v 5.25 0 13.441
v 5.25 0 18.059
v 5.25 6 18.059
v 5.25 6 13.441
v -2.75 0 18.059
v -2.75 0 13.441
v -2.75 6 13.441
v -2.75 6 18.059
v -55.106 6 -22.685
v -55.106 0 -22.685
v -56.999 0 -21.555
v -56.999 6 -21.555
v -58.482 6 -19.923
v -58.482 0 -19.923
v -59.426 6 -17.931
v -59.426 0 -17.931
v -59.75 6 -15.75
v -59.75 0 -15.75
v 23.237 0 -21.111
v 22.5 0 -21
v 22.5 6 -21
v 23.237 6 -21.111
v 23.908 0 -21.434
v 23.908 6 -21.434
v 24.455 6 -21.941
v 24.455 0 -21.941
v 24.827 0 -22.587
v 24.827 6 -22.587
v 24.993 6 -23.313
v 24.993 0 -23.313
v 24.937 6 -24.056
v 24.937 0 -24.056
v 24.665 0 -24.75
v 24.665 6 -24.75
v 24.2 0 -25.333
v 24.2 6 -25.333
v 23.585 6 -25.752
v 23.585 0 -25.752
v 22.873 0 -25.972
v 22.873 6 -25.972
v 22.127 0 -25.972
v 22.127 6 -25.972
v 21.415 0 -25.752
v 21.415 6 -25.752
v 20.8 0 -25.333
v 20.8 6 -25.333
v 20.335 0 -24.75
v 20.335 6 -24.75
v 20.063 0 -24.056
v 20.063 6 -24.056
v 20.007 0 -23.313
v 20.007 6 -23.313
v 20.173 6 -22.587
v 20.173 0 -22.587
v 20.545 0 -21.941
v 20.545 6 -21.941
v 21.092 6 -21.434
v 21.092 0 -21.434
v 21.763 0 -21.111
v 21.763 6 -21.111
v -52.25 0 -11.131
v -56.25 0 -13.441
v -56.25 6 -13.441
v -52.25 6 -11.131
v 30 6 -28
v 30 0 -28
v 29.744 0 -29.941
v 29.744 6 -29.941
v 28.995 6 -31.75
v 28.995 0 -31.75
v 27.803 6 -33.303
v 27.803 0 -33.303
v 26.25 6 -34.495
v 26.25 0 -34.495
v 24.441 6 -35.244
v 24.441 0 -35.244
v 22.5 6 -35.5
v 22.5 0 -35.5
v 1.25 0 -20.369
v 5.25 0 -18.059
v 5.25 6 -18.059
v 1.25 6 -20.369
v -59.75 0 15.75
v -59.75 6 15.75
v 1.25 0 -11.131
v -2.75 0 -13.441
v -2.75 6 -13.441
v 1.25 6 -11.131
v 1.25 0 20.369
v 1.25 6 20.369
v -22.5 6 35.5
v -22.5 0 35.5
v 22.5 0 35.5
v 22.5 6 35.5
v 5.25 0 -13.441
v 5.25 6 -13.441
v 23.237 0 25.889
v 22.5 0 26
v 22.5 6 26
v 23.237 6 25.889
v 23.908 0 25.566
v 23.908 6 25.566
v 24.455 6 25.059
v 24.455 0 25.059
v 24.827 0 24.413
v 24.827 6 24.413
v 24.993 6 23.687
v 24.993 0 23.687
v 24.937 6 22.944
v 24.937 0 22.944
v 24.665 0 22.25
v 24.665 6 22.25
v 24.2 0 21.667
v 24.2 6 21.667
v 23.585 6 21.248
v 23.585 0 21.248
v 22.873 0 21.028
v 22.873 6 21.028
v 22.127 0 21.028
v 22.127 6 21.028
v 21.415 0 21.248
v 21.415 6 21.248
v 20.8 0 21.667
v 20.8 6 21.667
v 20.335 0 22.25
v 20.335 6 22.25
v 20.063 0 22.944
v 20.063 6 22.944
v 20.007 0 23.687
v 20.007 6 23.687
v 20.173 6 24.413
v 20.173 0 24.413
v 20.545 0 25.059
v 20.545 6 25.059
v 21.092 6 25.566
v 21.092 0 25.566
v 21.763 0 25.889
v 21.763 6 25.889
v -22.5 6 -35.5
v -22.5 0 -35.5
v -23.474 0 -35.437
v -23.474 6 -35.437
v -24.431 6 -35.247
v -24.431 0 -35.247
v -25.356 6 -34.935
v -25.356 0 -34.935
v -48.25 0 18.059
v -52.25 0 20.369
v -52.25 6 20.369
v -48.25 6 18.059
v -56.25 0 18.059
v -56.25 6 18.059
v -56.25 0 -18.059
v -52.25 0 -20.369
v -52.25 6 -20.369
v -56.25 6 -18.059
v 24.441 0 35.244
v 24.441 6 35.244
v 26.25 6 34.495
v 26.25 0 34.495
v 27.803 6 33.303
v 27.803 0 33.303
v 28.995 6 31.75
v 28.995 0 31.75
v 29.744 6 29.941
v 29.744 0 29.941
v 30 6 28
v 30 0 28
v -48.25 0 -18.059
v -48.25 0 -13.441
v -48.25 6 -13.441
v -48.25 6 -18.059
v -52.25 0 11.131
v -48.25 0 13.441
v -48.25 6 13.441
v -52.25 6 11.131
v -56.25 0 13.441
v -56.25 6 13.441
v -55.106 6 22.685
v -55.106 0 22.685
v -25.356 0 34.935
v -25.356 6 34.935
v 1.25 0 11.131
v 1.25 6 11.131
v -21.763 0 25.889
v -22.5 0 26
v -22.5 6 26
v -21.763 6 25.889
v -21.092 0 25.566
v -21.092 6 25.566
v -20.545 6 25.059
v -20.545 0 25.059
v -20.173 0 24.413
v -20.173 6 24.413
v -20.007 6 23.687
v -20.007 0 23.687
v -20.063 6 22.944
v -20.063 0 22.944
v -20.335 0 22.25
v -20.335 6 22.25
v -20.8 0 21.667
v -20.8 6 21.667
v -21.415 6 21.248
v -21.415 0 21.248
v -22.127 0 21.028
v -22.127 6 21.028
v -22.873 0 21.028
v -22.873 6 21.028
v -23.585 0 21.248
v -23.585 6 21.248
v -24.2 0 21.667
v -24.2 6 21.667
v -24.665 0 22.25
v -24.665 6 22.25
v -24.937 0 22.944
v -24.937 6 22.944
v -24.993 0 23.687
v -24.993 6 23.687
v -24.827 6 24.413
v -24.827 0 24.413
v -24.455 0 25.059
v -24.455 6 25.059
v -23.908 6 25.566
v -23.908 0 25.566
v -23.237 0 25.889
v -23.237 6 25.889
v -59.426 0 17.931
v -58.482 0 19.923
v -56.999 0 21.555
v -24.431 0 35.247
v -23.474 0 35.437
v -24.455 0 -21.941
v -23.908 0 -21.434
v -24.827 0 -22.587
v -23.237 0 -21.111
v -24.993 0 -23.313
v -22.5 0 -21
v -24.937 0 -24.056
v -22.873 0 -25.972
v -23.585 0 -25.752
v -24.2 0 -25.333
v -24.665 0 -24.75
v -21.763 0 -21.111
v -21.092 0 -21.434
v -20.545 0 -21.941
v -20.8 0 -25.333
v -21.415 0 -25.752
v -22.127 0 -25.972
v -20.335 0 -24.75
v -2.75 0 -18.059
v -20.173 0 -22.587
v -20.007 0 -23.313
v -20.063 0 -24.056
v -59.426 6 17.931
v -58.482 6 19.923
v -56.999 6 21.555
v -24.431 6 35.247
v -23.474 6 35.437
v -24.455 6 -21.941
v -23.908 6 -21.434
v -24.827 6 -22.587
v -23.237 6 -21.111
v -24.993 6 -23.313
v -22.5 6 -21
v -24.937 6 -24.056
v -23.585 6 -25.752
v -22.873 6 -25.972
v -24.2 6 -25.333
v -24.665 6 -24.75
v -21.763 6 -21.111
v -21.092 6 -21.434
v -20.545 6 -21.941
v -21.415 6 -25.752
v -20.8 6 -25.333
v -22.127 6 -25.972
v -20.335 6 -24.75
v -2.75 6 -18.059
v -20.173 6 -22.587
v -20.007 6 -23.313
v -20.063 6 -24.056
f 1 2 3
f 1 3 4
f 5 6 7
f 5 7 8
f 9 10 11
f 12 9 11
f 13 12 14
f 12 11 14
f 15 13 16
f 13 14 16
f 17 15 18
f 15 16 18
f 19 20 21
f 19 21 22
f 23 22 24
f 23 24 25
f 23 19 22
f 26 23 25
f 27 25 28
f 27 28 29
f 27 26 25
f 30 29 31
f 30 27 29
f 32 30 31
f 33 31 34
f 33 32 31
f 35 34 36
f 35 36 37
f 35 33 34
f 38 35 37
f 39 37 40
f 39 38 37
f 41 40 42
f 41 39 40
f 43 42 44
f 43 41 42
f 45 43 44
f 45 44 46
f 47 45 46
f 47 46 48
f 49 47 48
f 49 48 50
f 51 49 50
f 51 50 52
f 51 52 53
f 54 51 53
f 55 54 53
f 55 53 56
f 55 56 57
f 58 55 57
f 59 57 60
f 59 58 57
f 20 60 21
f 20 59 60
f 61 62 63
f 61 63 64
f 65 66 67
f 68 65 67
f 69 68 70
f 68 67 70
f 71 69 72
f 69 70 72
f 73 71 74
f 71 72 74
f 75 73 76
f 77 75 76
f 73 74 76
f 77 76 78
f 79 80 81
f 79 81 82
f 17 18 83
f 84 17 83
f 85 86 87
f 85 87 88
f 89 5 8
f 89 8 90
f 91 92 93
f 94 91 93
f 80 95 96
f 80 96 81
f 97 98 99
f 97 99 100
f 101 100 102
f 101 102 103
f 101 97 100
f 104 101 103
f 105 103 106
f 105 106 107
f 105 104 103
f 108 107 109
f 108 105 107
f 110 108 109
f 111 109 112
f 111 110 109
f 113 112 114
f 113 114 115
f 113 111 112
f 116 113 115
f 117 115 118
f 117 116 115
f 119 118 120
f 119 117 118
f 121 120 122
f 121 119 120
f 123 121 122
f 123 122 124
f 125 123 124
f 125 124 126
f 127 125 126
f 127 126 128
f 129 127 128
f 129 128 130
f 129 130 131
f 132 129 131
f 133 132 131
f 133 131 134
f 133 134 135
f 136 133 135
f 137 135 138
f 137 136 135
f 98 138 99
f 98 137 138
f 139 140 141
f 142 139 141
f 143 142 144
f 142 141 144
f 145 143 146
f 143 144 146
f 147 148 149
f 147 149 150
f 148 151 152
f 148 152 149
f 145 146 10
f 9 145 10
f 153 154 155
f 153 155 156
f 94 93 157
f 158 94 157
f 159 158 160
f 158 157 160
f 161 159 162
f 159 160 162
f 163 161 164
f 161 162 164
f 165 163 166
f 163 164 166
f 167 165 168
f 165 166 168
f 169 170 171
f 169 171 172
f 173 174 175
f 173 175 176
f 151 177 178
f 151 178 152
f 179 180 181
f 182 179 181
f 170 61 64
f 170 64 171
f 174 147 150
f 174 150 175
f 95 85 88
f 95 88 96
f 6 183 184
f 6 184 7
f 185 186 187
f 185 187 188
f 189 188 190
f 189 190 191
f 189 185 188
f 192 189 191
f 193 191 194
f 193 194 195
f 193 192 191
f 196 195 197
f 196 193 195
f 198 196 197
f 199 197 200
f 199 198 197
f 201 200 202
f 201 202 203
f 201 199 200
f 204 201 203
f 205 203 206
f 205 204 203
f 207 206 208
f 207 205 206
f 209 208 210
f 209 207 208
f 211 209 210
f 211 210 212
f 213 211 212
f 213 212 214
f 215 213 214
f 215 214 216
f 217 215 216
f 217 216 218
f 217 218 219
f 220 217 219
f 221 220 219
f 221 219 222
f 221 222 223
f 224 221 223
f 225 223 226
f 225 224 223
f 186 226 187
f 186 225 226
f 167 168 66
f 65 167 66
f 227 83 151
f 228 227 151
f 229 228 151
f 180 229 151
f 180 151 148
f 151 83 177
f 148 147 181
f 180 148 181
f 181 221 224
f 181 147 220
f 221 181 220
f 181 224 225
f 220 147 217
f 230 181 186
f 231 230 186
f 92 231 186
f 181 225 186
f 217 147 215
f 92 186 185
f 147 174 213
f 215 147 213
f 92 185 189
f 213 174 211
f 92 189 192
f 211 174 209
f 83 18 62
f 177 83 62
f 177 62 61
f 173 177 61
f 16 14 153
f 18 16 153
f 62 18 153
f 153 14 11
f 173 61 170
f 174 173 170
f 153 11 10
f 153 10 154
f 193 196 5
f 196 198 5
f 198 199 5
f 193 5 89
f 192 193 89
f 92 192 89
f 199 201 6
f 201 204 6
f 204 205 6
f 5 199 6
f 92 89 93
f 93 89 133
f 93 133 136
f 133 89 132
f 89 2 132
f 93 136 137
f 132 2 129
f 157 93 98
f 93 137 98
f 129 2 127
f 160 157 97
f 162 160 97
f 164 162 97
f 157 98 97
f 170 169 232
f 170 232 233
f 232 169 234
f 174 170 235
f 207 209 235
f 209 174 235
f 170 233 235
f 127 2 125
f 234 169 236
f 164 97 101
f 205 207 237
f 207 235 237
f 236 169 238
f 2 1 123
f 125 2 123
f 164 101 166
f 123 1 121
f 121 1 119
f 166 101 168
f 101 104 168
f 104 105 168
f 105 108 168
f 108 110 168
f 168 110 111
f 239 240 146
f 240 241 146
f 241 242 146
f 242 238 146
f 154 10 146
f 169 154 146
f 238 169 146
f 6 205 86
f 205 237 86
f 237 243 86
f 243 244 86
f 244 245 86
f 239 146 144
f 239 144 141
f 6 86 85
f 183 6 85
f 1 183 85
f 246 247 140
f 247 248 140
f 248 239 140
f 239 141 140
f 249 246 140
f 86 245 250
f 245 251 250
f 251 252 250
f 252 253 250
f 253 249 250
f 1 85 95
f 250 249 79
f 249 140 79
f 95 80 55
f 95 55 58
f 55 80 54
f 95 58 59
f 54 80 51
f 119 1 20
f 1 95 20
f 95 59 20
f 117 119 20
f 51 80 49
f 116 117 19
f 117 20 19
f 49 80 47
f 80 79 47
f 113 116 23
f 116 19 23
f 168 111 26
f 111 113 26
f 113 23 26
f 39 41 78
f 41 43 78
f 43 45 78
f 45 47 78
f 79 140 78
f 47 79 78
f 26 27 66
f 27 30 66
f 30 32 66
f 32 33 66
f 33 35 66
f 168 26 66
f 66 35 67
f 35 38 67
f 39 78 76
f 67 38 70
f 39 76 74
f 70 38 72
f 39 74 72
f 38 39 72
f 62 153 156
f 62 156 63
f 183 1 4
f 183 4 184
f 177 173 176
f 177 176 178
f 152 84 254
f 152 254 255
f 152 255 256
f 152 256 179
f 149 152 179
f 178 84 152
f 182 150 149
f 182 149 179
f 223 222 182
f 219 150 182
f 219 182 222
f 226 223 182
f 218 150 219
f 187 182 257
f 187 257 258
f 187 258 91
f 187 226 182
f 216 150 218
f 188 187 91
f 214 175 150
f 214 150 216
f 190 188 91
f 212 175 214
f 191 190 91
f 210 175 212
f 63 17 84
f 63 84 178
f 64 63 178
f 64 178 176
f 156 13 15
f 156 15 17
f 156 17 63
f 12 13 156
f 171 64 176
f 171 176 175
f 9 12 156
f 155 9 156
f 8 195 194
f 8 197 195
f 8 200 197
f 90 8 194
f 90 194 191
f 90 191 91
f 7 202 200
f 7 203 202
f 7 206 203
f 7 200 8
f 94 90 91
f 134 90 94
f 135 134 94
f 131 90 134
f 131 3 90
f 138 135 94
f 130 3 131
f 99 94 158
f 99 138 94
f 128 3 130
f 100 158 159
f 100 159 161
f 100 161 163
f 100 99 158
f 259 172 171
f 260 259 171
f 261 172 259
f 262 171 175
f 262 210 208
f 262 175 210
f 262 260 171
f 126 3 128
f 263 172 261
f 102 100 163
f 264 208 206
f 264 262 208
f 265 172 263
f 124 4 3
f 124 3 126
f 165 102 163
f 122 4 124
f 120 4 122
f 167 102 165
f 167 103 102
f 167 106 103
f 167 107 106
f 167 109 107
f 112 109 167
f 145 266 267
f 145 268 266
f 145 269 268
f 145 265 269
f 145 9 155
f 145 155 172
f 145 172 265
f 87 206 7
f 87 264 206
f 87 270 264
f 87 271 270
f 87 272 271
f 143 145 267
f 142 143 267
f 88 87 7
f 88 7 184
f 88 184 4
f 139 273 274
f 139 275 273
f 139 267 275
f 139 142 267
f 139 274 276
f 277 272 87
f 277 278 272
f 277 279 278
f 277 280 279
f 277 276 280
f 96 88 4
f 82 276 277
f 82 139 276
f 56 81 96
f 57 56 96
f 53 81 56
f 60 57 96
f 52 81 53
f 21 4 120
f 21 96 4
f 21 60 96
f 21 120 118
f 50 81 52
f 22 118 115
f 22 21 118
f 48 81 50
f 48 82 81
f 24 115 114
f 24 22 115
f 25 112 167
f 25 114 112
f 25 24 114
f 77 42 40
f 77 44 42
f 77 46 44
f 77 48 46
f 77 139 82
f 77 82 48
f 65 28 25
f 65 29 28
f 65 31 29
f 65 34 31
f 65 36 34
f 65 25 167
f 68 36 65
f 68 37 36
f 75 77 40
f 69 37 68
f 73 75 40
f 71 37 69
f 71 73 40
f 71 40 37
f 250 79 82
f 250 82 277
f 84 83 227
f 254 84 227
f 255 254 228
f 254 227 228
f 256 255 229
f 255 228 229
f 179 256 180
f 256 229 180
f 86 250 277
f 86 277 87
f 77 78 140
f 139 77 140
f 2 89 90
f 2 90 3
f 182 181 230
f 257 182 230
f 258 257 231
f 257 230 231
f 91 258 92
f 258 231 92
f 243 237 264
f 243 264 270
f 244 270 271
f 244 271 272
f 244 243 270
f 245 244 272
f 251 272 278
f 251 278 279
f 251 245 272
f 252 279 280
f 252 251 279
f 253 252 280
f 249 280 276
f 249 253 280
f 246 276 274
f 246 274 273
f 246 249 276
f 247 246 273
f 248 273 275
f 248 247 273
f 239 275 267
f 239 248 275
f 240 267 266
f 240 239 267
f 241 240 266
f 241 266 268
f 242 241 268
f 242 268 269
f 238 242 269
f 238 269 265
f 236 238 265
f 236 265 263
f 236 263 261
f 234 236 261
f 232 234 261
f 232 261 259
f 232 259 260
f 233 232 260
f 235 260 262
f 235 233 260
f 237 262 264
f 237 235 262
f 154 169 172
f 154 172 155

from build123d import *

# Parameters (mm, degrees)
SKETCH1_R               = 7.5
SKETCH1_R_2             = 2.75
SKETCH1_R_3             = 2.5
BOSS_EXTRUDE1_DEPTH     = 6
CUT_EXTRUDE1_DEPTH      = 70.758959998
CUT_EXTRUDE1_DEPTH_BACK = 70.758959998


with BuildPart() as part:
    # Sketch1 → Boss-Extrude1 (new body)
    # profile 1 of 7: a face of its own
    with BuildSketch(Plane(origin=(0, 0, 0), x_dir=(1, 0, 0), z_dir=(0, 1, 0))):
        with Locations((-52.25, 15.75)):
            Circle(SKETCH1_R)
        with Locations(Location((-52.25, 15.75, 0), (0, 0, 270))):
            Circle(SKETCH1_R_2, mode=Mode.SUBTRACT)
    # profile 2 of 7: a face of its own
    with BuildSketch(Plane(origin=(0, 0, 0), x_dir=(1, 0, 0), z_dir=(0, 1, 0))):
        with BuildLine():
            ThreePointArc((-44.75, 15.75), (-52.25, 8.25), (-59.75, 15.75))
            Line((-59.75, 15.75), (-59.75, -15.75))
            ThreePointArc((-59.75, -15.75), (-52.25, -8.25), (-44.75, -15.75))
            ThreePointArc((-44.75, -15.75), (-48.076702535, -21.981660154), (-55.105623539, -22.685085739))
            Line((-55.105623539, -22.685085739), (-25.355623539, -34.935085739))
            ThreePointArc((-25.355623539, -34.935085739), (-26.673297465, -21.768339846), (-15, -28))
            ThreePointArc((-15, -28), (-17.196699141, -33.303300859), (-22.5, -35.5))
            Line((-22.5, -35.5), (22.5, -35.5))
            ThreePointArc((22.5, -35.5), (17.196699141, -22.696699141), (30, -28))
            Line((30, -28), (30, 28))
            ThreePointArc((30, 28), (17.196699141, 22.696699141), (22.5, 35.5))
            Line((22.5, 35.5), (-22.5, 35.5))
            ThreePointArc((-22.5, 35.5), (-17.196699141, 33.303300859), (-15, 28))
            ThreePointArc((-15, 28), (-26.673297465, 21.768339846), (-25.355623539, 34.935085739))
            Line((-25.355623539, 34.935085739), (-55.105623539, 22.685085739))
            ThreePointArc((-55.105623539, 22.685085739), (-48.076702535, 21.981660154), (-44.75, 15.75))
        make_face()
        with Locations(Location((1.25, -15.75, 0), (0, 0, 270))):
            Circle(SKETCH1_R_2, mode=Mode.SUBTRACT)
        with Locations(Location((1.25, 15.75, 0), (0, 0, 270))):
            Circle(SKETCH1_R_2, mode=Mode.SUBTRACT)
    # profile 3 of 7: a face of its own
    with BuildSketch(Plane(origin=(0, 0, 0), x_dir=(1, 0, 0), z_dir=(0, 1, 0))):
        with Locations((-52.25, -15.75)):
            Circle(SKETCH1_R)
        with Locations(Location((-52.25, -15.75, 0), (0, 0, 270))):
            Circle(SKETCH1_R_2, mode=Mode.SUBTRACT)
    # profile 4 of 7: a face of its own
    with BuildSketch(Plane(origin=(0, 0, 0), x_dir=(1, 0, 0), z_dir=(0, 1, 0))):
        with Locations((-22.5, -28)):
            Circle(SKETCH1_R)
        with Locations(Location((-22.5, -23.5, 0), (0, 0, 270))):
            Circle(SKETCH1_R_3, mode=Mode.SUBTRACT)
    # profile 5 of 7: a face of its own
    with BuildSketch(Plane(origin=(0, 0, 0), x_dir=(1, 0, 0), z_dir=(0, 1, 0))):
        with Locations((22.5, -28)):
            Circle(SKETCH1_R)
        with Locations(Location((22.5, -23.5, 0), (0, 0, 270))):
            Circle(SKETCH1_R_3, mode=Mode.SUBTRACT)
    # profile 6 of 7: a face of its own
    with BuildSketch(Plane(origin=(0, 0, 0), x_dir=(1, 0, 0), z_dir=(0, 1, 0))):
        with Locations((22.5, 28)):
            Circle(SKETCH1_R)
        with Locations(Location((22.5, 23.5, 0), (0, 0, 270))):
            Circle(SKETCH1_R_3, mode=Mode.SUBTRACT)
    # profile 7 of 7: a face of its own
    with BuildSketch(Plane(origin=(0, 0, 0), x_dir=(1, 0, 0), z_dir=(0, 1, 0))):
        with Locations((-22.5, 28)):
            Circle(SKETCH1_R)
        with Locations(Location((-22.5, 23.5, 0), (0, 0, 270))):
            Circle(SKETCH1_R_3, mode=Mode.SUBTRACT)
    extrude(amount=BOSS_EXTRUDE1_DEPTH)

    # Sketch2 → Cut-Extrude1 (cut, two sides: drawn at the far end of the back side and taken through both)
    with BuildSketch(Plane(origin=(0, 6, 0), x_dir=(1, 0, 0), z_dir=(0, 1, 0)).offset(-CUT_EXTRUDE1_DEPTH_BACK)):
        Polygon((-52.25, 11.131197846), (-48.25, 13.440598923), (-48.25, 18.059401077), (-52.25, 20.368802154), (-56.25, 18.059401077), (-56.25, 13.440598923), align=None)
        Polygon((-52.25, -11.131197846), (-56.25, -13.440598923), (-56.25, -18.059401077), (-52.25, -20.368802154), (-48.25, -18.059401077), (-48.25, -13.440598923), align=None)
        Polygon((-2.75, -18.059401077), (1.25, -20.368802154), (5.25, -18.059401077), (5.25, -13.440598923), (1.25, -11.131197846), (-2.75, -13.440598923), align=None)
        Polygon((1.25, 11.131197846), (5.25, 13.440598923), (5.25, 18.059401077), (1.25, 20.368802154), (-2.75, 18.059401077), (-2.75, 13.440598923), align=None)
    extrude(amount=CUT_EXTRUDE1_DEPTH + CUT_EXTRUDE1_DEPTH_BACK, mode=Mode.SUBTRACT)


solid = part.part
